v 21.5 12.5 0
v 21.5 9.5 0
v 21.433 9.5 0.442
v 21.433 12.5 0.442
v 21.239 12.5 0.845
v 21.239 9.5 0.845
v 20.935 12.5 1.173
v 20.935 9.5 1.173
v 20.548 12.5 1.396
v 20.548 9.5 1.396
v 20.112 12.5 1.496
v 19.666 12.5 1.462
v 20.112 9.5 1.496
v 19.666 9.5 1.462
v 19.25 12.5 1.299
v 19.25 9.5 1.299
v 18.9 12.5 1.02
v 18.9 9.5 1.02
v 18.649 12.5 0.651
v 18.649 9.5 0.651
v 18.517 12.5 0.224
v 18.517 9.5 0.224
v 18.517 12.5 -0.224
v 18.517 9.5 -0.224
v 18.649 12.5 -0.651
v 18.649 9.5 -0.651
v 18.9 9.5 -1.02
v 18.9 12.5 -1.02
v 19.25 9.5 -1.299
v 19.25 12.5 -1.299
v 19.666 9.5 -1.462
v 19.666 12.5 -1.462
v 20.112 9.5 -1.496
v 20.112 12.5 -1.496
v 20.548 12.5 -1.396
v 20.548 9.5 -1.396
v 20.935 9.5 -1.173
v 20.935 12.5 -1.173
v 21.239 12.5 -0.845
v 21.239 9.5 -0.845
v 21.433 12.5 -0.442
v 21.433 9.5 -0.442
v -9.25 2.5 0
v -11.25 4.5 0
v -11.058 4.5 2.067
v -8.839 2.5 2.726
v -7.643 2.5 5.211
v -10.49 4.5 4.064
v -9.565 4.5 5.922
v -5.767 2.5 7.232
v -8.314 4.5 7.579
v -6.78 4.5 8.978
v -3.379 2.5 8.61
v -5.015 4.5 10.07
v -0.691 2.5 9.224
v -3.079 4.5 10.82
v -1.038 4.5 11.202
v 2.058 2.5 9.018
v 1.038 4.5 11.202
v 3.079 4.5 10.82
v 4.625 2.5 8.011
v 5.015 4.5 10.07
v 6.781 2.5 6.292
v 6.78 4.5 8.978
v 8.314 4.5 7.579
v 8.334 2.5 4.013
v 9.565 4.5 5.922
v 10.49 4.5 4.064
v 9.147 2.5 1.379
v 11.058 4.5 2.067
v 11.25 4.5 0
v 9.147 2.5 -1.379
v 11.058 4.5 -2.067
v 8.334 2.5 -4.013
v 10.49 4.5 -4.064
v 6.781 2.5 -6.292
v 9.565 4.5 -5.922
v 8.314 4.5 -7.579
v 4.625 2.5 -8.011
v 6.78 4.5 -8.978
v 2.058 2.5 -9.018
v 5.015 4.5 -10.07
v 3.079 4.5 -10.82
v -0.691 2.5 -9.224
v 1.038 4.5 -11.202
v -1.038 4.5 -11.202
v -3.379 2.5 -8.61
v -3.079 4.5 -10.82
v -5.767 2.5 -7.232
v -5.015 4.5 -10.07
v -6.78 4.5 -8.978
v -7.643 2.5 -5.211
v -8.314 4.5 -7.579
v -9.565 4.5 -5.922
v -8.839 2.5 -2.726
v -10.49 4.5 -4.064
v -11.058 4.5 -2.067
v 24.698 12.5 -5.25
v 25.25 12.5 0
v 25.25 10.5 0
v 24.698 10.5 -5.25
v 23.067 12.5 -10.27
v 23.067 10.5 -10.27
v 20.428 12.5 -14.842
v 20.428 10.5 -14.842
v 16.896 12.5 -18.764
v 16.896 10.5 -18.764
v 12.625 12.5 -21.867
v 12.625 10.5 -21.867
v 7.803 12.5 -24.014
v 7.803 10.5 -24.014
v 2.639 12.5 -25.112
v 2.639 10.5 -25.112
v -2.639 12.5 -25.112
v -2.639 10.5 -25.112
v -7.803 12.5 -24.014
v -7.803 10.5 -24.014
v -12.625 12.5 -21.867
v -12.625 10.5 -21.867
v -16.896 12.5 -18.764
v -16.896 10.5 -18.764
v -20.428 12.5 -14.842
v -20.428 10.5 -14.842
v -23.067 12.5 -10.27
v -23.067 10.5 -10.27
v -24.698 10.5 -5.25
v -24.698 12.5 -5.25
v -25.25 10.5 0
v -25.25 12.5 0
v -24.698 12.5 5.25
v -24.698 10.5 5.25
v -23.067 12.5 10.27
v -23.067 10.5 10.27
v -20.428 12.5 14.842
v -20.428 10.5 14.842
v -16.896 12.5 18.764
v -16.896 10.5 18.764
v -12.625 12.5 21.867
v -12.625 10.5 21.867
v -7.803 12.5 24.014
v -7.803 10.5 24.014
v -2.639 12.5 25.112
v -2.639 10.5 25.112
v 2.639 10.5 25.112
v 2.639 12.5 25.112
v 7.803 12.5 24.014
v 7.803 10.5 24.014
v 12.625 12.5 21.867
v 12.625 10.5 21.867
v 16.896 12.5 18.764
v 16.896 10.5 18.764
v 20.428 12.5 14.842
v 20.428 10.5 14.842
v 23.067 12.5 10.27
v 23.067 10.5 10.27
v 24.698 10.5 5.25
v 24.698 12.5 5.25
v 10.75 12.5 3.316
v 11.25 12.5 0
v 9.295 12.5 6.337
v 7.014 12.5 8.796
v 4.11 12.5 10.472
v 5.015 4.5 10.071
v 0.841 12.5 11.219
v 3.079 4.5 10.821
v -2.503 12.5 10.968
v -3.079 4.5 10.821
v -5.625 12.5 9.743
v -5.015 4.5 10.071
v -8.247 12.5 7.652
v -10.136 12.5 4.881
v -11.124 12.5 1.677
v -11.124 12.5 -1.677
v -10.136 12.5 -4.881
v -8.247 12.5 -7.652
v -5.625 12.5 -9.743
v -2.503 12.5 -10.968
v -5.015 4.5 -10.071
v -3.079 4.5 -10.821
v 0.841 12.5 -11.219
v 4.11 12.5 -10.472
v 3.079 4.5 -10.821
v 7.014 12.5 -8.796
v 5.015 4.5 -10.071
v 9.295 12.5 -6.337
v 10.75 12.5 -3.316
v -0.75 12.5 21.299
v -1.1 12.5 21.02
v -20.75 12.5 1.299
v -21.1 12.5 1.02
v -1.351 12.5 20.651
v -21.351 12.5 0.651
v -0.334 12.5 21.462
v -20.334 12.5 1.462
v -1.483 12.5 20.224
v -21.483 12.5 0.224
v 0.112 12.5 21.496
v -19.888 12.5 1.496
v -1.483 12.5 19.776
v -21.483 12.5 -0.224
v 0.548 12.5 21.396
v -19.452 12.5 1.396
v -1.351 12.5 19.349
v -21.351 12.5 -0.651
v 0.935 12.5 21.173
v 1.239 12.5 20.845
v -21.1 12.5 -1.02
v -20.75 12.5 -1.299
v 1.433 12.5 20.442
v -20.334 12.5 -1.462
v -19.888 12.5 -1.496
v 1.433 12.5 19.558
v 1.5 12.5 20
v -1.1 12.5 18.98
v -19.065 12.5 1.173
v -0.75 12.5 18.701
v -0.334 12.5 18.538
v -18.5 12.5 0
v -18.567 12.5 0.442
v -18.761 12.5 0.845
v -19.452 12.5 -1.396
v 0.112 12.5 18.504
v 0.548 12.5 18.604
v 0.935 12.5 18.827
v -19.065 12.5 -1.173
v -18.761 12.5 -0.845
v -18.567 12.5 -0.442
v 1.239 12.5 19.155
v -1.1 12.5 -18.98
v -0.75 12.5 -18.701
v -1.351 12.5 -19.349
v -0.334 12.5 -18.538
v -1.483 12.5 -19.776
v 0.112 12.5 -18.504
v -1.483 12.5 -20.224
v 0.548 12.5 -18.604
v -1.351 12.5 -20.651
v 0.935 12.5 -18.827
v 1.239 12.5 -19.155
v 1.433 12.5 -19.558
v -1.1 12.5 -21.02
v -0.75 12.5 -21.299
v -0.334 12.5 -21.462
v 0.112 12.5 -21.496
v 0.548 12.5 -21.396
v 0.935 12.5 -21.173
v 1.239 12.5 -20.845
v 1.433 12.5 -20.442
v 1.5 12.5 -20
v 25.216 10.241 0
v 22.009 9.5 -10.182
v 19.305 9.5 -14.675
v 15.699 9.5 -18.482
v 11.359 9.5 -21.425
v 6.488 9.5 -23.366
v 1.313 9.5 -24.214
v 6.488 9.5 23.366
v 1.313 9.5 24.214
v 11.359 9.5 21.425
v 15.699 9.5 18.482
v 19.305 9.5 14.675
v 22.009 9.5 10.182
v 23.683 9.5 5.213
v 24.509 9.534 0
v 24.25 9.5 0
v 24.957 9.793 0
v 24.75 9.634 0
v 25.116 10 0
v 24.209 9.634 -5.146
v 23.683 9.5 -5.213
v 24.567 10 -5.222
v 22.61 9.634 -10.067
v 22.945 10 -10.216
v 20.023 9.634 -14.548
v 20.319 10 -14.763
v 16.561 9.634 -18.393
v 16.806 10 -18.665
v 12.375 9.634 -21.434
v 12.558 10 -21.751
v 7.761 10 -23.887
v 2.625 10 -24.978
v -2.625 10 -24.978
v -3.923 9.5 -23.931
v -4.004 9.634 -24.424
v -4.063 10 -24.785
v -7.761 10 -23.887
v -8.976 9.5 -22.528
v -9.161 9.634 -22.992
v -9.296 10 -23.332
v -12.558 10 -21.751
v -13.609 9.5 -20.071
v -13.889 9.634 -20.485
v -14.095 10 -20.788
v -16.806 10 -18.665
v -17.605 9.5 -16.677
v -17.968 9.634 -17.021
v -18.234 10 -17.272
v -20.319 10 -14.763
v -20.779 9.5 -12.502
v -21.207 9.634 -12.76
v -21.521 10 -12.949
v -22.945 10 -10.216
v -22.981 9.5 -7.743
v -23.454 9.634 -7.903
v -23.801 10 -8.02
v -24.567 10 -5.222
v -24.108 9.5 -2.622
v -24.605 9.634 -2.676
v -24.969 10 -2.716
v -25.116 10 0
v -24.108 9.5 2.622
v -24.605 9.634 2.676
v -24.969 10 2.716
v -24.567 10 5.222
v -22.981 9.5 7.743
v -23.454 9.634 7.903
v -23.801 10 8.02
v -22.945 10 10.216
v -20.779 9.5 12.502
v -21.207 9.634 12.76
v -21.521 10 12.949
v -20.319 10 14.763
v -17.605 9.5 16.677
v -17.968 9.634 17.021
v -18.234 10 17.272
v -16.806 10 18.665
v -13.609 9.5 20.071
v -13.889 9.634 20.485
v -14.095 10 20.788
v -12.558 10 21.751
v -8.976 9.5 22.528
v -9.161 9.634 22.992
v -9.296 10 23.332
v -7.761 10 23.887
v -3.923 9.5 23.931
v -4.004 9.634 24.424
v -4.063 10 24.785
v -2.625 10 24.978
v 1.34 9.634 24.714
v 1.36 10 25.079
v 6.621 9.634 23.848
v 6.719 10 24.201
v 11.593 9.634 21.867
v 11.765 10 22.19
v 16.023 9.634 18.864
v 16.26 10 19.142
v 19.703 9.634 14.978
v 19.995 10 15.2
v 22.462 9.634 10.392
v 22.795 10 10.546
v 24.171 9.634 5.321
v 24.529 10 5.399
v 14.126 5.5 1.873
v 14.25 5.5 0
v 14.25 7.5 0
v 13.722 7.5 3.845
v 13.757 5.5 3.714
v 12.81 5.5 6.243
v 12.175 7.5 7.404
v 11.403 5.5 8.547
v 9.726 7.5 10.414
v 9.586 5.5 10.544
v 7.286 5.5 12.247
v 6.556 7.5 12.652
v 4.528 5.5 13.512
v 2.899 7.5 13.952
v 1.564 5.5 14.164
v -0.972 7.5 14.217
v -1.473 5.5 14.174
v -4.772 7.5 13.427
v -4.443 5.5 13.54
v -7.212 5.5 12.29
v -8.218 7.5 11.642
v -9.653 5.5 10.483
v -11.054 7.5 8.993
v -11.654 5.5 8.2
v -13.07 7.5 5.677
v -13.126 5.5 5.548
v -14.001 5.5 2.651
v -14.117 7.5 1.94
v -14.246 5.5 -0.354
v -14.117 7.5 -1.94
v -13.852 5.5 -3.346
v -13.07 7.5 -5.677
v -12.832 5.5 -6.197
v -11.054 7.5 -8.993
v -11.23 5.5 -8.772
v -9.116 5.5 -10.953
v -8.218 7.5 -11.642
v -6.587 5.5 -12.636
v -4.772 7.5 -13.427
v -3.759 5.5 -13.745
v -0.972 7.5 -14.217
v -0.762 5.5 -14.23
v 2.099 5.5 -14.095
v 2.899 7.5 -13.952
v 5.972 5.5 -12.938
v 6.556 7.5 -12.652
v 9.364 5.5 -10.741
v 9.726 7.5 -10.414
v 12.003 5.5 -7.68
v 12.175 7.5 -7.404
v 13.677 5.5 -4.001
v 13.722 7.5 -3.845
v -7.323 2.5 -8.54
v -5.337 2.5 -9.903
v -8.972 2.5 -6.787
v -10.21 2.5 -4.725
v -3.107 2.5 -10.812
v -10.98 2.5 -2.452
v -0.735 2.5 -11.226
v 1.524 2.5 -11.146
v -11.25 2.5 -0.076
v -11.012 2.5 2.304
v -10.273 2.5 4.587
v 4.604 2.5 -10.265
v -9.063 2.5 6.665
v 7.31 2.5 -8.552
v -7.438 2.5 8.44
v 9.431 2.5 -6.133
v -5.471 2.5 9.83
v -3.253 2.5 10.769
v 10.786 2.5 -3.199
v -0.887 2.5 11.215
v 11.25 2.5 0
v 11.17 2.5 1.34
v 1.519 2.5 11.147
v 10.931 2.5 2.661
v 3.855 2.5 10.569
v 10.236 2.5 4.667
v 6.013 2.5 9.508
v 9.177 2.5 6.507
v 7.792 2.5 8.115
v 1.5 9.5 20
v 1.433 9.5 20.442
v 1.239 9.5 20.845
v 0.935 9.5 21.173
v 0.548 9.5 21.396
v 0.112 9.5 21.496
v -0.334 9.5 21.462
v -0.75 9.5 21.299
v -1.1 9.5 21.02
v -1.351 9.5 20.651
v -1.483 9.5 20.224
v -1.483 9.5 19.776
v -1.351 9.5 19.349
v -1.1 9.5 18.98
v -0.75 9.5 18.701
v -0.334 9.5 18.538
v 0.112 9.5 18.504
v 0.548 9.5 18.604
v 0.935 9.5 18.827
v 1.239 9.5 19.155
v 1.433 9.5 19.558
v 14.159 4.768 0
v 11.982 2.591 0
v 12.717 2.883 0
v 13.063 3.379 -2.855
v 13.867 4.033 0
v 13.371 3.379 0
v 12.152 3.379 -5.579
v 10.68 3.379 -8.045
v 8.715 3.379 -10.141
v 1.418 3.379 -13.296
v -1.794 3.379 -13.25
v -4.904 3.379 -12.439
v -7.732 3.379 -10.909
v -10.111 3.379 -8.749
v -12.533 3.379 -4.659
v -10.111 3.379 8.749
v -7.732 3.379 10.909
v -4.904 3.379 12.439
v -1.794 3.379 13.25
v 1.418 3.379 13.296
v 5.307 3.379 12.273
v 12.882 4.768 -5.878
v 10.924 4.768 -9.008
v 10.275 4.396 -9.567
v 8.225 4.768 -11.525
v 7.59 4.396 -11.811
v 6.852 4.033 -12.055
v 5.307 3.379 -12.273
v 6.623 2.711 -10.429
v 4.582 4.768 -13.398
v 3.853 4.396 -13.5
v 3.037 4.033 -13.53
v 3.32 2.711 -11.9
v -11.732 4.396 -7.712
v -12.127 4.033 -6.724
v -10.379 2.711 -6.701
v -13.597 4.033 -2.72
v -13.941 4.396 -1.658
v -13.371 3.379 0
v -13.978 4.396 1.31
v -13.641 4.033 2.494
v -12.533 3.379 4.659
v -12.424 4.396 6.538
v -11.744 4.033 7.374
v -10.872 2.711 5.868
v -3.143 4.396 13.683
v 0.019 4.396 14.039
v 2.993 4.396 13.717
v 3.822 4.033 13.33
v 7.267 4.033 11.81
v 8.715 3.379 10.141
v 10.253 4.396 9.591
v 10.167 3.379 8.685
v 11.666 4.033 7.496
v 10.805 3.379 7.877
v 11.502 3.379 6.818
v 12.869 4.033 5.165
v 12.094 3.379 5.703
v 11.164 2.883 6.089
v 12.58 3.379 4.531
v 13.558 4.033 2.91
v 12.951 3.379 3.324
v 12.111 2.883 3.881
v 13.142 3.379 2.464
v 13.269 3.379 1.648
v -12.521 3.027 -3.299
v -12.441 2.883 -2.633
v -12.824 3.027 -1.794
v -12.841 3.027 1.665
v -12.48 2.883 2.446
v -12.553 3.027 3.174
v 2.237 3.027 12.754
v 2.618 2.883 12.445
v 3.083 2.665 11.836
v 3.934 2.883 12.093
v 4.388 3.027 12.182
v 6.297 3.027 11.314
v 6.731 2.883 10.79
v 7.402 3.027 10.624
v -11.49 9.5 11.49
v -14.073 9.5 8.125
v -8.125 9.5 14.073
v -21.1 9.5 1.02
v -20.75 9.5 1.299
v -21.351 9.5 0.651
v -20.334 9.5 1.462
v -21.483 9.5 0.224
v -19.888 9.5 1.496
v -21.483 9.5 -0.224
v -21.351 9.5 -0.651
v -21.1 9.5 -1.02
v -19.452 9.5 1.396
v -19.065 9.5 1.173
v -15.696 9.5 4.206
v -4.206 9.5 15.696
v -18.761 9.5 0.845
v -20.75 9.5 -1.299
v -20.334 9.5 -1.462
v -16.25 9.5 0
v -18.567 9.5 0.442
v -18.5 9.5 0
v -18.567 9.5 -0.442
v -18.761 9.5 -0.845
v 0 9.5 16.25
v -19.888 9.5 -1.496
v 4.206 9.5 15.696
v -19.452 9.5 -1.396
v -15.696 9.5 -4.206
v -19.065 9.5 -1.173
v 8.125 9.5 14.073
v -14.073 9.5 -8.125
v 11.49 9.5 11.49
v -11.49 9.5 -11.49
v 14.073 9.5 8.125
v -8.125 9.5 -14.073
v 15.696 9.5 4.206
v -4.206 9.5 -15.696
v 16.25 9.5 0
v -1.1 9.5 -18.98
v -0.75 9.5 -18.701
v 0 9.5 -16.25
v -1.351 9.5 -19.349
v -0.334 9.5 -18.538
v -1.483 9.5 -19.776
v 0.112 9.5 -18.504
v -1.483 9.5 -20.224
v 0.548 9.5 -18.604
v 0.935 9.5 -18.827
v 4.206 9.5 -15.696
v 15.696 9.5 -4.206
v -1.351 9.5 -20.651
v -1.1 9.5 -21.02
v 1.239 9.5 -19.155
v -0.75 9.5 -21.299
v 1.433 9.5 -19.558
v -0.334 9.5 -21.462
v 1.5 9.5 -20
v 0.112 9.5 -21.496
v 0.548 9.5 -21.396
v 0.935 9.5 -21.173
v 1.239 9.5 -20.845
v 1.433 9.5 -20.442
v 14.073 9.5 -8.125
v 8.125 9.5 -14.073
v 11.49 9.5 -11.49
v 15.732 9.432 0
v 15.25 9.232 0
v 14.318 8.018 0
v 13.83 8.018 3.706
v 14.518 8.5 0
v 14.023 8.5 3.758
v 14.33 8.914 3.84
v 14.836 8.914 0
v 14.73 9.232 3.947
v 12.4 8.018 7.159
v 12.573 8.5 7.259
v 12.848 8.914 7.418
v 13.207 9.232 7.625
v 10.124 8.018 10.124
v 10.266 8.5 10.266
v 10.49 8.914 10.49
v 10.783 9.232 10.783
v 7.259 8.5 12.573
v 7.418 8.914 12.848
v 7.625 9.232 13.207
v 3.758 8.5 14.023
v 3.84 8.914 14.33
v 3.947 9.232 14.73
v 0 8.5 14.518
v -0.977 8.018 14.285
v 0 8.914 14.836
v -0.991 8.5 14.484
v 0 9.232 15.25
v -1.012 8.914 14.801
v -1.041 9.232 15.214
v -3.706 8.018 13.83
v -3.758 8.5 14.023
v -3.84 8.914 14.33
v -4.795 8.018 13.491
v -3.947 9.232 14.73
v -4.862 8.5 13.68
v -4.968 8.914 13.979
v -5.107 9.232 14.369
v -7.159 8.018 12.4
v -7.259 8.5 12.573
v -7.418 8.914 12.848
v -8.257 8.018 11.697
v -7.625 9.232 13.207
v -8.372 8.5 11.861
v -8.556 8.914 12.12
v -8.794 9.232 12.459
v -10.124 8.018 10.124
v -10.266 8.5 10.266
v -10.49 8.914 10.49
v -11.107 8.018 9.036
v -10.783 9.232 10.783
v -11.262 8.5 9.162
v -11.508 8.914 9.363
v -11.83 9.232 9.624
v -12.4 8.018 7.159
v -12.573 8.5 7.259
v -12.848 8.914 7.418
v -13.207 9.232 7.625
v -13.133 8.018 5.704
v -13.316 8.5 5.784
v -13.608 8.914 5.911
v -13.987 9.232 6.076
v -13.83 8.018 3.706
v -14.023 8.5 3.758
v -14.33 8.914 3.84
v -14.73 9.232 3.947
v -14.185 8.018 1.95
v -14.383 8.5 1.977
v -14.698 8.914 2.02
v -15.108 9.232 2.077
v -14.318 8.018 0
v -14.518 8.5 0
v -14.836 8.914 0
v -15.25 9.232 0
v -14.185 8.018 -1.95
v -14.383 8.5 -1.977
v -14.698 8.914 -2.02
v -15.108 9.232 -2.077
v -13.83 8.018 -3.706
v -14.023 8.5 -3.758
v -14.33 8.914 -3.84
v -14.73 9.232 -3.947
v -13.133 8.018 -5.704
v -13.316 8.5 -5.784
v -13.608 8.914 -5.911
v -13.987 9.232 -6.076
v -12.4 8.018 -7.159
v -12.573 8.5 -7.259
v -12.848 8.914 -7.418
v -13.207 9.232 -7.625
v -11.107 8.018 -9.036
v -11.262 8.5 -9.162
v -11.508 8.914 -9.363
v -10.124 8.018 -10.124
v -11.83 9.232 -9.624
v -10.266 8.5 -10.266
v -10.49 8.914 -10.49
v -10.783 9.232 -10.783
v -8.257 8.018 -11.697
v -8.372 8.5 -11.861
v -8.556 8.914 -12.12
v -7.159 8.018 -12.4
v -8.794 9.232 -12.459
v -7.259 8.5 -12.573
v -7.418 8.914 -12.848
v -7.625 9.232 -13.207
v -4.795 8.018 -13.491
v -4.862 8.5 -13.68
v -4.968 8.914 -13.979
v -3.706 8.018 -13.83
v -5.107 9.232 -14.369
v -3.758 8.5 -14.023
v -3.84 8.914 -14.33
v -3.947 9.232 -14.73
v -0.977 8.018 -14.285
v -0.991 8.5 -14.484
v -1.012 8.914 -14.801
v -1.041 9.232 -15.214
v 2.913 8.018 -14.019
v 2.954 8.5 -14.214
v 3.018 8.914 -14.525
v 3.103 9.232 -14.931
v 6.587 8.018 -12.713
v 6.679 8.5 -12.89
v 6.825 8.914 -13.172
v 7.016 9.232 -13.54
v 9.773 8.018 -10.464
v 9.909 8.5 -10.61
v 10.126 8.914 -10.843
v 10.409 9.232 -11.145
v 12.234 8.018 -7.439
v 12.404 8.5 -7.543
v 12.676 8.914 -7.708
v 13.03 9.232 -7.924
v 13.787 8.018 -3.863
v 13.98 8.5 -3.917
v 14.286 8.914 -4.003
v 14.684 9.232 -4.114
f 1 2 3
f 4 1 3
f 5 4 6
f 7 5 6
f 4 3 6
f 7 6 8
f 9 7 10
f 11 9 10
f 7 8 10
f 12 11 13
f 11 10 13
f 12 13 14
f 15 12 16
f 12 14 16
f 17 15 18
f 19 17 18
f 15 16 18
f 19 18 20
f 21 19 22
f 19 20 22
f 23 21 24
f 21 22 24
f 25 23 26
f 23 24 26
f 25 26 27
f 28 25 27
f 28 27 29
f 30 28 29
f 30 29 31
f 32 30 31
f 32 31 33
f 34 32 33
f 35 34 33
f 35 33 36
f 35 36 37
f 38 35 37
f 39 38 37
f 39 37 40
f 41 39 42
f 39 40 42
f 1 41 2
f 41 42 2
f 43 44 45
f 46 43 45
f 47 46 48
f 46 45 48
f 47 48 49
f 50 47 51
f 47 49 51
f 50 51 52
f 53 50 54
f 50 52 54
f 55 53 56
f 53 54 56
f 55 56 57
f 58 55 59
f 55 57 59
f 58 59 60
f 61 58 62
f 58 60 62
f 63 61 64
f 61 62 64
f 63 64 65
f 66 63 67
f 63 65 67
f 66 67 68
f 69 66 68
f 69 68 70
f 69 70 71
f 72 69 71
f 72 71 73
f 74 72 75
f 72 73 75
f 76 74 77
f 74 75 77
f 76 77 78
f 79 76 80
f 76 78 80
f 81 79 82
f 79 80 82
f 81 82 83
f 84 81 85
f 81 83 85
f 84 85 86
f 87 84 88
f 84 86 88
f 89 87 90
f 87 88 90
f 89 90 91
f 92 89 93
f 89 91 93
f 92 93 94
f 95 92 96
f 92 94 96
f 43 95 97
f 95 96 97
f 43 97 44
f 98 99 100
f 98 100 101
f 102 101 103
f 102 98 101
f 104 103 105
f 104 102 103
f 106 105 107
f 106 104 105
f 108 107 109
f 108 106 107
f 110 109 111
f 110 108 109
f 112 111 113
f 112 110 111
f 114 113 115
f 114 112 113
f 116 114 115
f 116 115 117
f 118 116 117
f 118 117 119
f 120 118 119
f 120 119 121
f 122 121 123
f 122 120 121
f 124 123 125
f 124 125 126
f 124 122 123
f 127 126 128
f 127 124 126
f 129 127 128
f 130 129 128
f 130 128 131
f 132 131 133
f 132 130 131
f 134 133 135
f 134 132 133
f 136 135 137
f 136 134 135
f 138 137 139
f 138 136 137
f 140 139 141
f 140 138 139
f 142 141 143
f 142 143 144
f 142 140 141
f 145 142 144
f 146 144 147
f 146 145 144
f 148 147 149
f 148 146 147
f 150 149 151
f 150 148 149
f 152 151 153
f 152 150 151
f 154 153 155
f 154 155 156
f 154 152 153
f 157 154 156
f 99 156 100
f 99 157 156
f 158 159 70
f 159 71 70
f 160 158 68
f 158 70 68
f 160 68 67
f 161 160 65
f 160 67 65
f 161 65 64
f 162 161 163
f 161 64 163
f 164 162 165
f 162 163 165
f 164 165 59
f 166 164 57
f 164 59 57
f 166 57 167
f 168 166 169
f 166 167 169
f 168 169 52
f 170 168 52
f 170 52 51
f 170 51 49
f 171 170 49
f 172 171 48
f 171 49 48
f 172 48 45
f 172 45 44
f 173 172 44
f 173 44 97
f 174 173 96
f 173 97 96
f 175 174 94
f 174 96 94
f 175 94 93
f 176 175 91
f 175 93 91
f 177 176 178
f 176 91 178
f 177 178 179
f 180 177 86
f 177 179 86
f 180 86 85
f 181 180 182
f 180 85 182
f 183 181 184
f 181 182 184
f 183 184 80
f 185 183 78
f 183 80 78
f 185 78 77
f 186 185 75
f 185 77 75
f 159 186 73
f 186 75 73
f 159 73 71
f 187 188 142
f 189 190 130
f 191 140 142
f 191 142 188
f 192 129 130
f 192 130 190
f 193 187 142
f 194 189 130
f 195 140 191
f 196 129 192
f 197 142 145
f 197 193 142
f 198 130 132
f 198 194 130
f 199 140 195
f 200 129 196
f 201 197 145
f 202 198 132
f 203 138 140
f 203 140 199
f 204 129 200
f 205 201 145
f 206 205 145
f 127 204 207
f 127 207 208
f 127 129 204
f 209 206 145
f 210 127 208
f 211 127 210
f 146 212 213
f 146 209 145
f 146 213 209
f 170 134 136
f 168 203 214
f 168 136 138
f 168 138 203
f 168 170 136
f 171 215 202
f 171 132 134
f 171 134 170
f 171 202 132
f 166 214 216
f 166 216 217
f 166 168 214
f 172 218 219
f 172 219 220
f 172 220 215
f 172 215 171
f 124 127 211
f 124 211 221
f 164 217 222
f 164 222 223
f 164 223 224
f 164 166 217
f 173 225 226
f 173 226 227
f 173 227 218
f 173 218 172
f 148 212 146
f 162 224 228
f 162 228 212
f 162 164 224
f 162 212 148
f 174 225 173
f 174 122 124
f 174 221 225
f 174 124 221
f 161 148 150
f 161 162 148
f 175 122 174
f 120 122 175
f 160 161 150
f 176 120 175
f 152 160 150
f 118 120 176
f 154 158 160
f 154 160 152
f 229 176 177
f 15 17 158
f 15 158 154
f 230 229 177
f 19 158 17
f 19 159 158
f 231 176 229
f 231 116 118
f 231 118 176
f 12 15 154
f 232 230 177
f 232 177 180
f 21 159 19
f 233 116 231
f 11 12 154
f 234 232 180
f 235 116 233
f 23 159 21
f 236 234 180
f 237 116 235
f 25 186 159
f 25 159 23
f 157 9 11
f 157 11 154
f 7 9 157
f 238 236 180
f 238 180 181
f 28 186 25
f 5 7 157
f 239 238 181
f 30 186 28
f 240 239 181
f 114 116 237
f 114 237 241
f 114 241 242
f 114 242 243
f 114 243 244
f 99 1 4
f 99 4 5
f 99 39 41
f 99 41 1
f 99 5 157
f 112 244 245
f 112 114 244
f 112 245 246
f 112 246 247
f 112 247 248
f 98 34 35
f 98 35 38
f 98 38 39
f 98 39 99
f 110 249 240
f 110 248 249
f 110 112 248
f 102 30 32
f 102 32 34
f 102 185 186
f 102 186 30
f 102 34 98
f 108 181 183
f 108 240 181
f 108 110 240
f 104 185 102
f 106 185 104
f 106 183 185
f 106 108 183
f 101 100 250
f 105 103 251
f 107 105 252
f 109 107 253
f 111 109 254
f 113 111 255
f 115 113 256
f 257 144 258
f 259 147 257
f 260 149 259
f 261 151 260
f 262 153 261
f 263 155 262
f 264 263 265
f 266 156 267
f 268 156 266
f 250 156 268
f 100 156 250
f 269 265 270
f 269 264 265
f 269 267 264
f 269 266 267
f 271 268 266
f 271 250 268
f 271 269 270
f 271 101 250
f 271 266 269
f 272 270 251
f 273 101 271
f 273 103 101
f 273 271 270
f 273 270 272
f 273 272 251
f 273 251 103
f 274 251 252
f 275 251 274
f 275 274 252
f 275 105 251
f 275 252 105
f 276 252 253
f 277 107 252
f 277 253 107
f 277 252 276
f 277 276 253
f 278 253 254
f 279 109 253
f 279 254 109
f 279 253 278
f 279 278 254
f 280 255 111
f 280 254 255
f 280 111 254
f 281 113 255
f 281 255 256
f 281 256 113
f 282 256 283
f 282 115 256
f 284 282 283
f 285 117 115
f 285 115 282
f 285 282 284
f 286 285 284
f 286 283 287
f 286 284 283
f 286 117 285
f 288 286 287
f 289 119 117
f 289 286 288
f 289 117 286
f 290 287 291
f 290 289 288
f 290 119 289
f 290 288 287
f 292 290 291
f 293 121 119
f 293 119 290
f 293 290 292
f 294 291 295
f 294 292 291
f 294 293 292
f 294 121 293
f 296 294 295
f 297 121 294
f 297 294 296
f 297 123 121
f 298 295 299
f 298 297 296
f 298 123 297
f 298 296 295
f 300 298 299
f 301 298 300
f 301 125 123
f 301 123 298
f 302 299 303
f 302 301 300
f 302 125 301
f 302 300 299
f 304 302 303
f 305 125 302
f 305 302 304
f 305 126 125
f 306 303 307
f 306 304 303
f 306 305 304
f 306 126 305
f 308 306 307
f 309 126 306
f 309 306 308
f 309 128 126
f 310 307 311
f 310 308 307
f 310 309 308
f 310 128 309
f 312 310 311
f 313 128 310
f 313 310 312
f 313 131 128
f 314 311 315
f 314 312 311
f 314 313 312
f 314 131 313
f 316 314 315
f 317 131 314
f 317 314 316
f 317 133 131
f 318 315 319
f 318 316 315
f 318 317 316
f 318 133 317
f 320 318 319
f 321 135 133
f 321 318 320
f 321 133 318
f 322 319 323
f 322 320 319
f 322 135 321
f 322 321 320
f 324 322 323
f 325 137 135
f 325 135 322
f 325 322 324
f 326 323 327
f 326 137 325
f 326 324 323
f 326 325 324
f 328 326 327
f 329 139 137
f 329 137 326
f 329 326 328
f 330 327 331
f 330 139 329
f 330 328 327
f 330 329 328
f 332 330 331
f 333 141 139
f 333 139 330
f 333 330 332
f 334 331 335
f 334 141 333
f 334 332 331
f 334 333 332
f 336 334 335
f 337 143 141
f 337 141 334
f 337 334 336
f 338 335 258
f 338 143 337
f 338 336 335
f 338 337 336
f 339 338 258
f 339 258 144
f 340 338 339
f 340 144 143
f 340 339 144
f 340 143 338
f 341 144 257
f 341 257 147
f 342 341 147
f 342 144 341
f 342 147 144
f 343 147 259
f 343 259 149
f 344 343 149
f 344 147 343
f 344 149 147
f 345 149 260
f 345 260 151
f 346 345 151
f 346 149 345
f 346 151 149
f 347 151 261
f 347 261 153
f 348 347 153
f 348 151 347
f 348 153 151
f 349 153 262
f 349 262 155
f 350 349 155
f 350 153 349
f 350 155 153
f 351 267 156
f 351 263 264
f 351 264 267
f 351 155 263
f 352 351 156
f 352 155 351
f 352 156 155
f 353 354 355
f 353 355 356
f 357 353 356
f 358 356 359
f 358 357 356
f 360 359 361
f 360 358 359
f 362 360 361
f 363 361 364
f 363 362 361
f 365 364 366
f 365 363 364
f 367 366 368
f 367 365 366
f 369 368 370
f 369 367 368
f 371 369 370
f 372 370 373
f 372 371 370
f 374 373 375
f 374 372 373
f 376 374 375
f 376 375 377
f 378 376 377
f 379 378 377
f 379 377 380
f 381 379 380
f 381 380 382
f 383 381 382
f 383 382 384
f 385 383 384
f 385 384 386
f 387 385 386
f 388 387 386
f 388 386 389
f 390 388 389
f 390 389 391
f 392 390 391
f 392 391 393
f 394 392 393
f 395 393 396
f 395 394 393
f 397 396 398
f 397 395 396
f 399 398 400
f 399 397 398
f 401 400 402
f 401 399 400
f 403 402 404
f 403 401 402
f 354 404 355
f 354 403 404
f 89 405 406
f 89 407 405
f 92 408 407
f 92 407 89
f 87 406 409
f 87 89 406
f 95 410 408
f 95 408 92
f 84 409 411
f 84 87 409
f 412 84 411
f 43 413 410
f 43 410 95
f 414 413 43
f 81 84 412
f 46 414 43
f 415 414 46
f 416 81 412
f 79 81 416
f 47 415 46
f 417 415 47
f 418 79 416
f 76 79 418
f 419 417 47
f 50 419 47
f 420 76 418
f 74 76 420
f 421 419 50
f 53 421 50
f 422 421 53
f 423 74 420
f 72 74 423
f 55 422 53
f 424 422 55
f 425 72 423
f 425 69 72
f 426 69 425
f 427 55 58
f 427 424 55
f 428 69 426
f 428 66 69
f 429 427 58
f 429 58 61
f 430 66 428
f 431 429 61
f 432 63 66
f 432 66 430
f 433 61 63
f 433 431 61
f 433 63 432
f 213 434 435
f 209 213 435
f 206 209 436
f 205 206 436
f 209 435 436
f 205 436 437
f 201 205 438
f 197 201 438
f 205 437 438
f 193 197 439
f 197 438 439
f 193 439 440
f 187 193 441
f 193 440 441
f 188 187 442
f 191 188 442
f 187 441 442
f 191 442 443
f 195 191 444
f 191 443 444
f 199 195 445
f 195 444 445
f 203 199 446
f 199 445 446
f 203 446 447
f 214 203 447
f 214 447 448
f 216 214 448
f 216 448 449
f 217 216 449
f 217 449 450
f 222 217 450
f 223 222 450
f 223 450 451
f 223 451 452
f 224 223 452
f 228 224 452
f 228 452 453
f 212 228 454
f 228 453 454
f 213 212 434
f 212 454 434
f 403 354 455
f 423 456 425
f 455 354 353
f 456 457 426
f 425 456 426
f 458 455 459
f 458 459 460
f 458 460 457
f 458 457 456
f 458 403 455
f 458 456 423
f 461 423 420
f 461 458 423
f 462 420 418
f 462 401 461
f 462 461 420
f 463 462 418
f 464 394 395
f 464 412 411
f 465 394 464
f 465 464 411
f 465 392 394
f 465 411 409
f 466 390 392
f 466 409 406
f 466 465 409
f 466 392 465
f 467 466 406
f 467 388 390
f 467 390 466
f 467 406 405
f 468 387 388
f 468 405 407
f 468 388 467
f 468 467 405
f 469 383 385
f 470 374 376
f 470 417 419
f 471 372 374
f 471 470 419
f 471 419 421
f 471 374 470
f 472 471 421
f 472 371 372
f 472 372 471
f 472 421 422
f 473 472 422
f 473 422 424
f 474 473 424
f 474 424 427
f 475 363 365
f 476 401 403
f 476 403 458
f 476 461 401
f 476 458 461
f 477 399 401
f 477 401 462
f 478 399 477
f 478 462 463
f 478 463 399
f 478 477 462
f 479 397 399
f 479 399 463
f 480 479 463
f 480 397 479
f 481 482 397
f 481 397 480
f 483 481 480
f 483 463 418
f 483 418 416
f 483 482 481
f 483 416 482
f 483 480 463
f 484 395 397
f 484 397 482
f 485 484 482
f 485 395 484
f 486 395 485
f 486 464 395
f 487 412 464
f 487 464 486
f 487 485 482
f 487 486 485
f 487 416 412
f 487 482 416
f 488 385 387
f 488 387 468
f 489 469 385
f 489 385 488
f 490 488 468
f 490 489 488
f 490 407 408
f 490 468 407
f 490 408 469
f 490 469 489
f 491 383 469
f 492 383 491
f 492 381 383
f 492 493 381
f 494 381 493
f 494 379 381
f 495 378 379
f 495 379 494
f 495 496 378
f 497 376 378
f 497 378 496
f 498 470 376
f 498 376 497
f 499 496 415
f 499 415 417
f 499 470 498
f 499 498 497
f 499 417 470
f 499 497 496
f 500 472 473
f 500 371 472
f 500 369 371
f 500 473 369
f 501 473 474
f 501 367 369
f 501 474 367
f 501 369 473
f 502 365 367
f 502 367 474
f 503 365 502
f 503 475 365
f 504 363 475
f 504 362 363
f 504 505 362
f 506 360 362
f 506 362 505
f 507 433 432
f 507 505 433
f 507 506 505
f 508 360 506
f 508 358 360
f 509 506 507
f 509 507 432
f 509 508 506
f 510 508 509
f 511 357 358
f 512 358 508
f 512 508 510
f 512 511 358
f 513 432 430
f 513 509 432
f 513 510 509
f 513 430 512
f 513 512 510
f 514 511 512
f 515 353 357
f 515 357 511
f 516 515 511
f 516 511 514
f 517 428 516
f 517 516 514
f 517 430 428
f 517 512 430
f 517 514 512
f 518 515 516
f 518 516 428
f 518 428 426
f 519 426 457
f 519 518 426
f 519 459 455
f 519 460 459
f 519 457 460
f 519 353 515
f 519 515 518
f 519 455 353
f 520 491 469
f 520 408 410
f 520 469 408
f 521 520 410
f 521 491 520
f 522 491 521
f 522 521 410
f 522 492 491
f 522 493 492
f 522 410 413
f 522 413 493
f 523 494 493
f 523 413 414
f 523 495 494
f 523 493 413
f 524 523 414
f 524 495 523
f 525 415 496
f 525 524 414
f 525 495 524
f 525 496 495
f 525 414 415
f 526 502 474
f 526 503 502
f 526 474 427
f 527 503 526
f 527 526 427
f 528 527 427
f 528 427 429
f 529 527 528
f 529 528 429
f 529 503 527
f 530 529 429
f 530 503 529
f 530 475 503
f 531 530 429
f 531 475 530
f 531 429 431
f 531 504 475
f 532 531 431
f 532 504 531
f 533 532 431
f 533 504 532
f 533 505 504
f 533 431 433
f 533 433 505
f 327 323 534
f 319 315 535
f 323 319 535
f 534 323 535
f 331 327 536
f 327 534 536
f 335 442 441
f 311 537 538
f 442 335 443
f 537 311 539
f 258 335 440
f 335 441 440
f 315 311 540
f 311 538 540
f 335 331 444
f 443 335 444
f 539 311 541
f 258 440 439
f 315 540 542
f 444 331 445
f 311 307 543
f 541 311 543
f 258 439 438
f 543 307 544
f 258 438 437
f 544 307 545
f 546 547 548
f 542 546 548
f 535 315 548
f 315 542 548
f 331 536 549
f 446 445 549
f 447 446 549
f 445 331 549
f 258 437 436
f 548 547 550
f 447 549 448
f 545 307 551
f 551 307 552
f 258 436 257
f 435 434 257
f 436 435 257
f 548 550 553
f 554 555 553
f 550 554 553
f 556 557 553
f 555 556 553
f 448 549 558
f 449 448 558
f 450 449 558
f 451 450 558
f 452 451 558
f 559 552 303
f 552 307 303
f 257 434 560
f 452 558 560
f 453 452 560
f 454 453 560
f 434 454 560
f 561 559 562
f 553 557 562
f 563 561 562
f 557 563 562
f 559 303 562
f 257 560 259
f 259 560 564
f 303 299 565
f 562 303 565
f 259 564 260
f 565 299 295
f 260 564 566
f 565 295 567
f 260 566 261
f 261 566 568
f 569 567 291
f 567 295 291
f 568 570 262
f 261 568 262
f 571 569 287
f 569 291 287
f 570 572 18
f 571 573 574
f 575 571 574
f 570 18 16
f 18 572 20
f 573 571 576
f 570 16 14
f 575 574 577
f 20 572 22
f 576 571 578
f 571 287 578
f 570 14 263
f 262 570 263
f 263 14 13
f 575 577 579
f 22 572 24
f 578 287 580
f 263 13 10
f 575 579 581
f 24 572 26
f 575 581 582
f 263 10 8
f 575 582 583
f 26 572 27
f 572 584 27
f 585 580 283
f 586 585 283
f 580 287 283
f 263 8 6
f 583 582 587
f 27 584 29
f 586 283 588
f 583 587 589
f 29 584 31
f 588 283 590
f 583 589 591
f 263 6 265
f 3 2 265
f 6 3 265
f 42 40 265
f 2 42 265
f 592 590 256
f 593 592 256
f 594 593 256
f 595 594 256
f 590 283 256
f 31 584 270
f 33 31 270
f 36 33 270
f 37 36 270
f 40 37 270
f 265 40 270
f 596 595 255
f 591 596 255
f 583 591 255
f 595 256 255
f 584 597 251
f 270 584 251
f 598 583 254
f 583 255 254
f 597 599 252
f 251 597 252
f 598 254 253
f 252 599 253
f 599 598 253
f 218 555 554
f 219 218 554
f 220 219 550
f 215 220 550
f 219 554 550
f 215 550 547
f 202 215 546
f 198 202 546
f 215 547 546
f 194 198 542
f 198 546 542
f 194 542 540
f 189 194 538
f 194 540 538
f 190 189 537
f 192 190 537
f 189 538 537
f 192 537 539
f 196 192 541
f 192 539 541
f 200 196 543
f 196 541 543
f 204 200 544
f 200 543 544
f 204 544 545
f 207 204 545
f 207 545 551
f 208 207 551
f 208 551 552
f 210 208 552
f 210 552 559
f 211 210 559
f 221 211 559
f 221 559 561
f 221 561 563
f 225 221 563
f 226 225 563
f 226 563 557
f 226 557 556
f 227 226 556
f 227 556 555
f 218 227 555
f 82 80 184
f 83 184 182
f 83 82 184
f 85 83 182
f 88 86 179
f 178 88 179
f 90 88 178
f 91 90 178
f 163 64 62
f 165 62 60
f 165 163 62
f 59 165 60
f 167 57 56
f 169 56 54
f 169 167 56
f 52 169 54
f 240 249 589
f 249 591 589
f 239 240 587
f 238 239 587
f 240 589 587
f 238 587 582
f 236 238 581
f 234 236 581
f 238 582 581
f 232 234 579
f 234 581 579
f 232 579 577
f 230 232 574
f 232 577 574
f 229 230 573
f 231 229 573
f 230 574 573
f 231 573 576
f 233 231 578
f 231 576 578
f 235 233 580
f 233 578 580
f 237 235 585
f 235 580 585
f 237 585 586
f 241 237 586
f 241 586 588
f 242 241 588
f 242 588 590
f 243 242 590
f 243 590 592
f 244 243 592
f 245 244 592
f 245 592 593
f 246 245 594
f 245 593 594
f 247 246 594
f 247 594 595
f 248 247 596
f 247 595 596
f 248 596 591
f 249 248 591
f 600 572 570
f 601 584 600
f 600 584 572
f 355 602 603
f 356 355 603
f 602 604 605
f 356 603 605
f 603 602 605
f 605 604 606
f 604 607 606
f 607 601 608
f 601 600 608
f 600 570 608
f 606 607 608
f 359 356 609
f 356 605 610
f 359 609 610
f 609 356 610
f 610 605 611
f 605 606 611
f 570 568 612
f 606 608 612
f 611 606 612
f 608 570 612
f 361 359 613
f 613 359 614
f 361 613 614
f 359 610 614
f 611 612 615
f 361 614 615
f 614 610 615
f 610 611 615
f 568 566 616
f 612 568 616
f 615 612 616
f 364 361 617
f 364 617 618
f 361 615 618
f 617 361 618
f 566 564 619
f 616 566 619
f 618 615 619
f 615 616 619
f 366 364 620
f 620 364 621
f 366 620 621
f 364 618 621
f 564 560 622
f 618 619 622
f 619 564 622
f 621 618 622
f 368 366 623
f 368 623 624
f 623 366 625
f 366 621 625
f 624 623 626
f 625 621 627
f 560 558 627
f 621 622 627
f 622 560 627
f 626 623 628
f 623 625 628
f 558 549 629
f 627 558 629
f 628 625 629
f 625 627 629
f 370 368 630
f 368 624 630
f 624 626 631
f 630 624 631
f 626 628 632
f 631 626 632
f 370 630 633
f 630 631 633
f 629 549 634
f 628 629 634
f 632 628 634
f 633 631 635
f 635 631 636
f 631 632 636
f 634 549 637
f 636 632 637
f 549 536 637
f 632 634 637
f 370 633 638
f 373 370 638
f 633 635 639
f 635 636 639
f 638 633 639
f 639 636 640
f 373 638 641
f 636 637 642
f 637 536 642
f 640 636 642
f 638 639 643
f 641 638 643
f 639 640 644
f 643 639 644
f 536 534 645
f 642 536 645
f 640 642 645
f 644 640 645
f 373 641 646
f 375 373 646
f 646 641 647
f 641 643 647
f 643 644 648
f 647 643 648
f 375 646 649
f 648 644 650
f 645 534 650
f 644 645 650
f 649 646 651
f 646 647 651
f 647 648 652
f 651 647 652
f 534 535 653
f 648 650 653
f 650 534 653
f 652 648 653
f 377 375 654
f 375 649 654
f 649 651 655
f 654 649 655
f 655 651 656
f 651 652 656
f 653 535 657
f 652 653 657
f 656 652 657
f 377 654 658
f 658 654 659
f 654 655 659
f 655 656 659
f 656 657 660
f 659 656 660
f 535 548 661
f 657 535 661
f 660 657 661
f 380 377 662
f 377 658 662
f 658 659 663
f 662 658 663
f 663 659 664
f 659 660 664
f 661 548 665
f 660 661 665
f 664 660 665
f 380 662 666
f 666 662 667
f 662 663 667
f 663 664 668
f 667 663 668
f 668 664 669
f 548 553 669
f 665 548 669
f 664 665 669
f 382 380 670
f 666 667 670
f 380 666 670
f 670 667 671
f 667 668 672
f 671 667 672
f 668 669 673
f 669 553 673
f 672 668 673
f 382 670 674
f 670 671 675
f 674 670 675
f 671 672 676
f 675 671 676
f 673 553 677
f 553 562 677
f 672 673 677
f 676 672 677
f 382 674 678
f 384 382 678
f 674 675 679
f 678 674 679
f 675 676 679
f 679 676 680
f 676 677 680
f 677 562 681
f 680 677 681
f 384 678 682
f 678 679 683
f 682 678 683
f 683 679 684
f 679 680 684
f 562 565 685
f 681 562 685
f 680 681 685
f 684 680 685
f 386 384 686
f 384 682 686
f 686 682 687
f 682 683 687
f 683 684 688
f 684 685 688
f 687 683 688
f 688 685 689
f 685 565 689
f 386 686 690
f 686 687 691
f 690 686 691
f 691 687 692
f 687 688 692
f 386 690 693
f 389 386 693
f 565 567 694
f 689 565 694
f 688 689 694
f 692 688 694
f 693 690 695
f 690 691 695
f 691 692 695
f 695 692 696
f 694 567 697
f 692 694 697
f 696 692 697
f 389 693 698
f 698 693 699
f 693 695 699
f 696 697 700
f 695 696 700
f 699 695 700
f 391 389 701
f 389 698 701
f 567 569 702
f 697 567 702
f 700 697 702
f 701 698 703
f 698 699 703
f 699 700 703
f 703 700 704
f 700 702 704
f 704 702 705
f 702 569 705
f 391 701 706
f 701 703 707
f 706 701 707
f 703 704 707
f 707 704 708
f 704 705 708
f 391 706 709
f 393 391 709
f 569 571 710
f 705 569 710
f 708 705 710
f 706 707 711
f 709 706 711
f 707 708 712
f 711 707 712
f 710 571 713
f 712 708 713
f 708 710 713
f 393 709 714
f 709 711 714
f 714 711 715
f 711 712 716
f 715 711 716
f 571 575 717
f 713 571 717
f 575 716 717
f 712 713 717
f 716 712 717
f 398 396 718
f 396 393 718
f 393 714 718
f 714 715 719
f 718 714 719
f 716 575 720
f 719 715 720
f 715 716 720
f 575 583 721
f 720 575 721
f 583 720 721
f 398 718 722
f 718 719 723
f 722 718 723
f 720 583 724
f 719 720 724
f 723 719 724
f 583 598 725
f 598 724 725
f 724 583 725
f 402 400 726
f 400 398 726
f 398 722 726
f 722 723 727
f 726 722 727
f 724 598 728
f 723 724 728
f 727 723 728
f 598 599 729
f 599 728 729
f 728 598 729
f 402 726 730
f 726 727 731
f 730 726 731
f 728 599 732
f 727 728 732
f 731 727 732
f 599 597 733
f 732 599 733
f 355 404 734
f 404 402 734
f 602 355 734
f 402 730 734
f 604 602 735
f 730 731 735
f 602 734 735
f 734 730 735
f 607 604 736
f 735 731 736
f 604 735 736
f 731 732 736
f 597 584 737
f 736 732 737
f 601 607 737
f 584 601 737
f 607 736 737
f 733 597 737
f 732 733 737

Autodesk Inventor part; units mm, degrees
ref_plane "YZ Plane" through (0, 0, 0) normal (1, 0, 0) x (0, 1, 0)
ref_plane "XZ Plane" through (0, 0, 0) normal (0, 1, 0) x (-1, 0, 0)
ref_plane "XY Plane" through (0, 0, 0) normal (0, 0, 1) x (1, 0, 0)
sketch "Sketch1" plane through (0, 0, 0) normal (0, 1, 0) x (-1, 0, 0)
  circle A0 centre (0, 0) radius 11.25
  circle A1 centre (0, 0) radius 14.25
  circle A2 centre (0, 0) radius 30
  circle A3 centre (0, 0) radius 6.75
  dimension "d0" = 22.5
  dimension "d1" = 28.5
  dimension "d2" = 60
  dimension "d3" = 13.5
extrude "Extrusion1" add sketch "Sketch1" along normal blind 4.5 contours A0 | A1
sketch "Sketch2" plane through (0, 4.5, 0) normal (0, 1, 0) x (1, 0, 0)
  circle A0 centre (0, 0) radius 14.25 projected
  circle A1 centre (0, 0) radius 11.25
  dimension "d6" = 22.5
extrude "Extrusion2" add sketch "Sketch2" along normal blind 8
sketch "Sketch3" plane through (0, 12.5, 0) normal (0, 1, 0) x (1, 0, 0)
  circle A0 centre (0, 0) radius 14.25 projected
  circle A1 centre (0, 0) radius 25.25
  dimension "d9" = 50.5
extrude "Extrusion3" add sketch "Sketch3" against normal blind 3
chamfer "Chamfer2" distance 4.5 angle 45 1 edges at (6.75, 4.5, 0)
fillet "Fillet1" radius 5 1 edges at (14.25, 0, 0)
fillet "Fillet2" radius 2 1 edges at (-14.25, 9.5, 0)
fillet "Fillet3" radius 1 1 edges at (-25.25, 9.5, 0)
sketch "Sketch5" plane through (0, 9.5, 0) normal (0, -1, 0) x (1, 0, 0)
  circle A0 centre (0, 0) radius 16.25 projected
  circle A1 centre (-20, 0) radius 1.5
  circle A2 centre (-20, 0) radius 3.75
  circle A3 centre (20, 0) radius 1.5
  circle A4 centre (0, -20) radius 1.5
  circle A5 centre (0, 20) radius 1.5
  dimension "d21" = 3
  dimension "d22" = 20
  dimension "d23" = 3
  dimension "d24" = 20
  dimension "d25" = 3
  dimension "d26" = 20
  dimension "d27" = 3
  dimension "d28" = 20
extrude "Extrusion4" cut sketch "Sketch5" against normal blind 11 contours A1 | A3 | A4 | A5
sketch "Sketch6" plane through (0, 0, 0) normal (0, -1, 0) x (1, 0, 0)
  circle A0 centre (0, 0) radius 9.25 projected
  circle A1 centre (0, 0) radius 18.9593
extrude "Extrusion5" cut sketch "Sketch6" against normal blind 2.5 contours A0 | A1
sketch "Sketch7" plane through (0, 2.5, 0) normal (0, -1, 0) x (1, 0, 0)
  circle A0 centre (0, 0) radius 13.5801 projected
  circle A1 centre (0, 0) radius 9.25 projected
fillet "Fillet4" radius 3 2 edges at (0, 2.5, 13.5801) (0, 2.5, -13.5801)
properties part number "supportoCuscinettoAlto"
